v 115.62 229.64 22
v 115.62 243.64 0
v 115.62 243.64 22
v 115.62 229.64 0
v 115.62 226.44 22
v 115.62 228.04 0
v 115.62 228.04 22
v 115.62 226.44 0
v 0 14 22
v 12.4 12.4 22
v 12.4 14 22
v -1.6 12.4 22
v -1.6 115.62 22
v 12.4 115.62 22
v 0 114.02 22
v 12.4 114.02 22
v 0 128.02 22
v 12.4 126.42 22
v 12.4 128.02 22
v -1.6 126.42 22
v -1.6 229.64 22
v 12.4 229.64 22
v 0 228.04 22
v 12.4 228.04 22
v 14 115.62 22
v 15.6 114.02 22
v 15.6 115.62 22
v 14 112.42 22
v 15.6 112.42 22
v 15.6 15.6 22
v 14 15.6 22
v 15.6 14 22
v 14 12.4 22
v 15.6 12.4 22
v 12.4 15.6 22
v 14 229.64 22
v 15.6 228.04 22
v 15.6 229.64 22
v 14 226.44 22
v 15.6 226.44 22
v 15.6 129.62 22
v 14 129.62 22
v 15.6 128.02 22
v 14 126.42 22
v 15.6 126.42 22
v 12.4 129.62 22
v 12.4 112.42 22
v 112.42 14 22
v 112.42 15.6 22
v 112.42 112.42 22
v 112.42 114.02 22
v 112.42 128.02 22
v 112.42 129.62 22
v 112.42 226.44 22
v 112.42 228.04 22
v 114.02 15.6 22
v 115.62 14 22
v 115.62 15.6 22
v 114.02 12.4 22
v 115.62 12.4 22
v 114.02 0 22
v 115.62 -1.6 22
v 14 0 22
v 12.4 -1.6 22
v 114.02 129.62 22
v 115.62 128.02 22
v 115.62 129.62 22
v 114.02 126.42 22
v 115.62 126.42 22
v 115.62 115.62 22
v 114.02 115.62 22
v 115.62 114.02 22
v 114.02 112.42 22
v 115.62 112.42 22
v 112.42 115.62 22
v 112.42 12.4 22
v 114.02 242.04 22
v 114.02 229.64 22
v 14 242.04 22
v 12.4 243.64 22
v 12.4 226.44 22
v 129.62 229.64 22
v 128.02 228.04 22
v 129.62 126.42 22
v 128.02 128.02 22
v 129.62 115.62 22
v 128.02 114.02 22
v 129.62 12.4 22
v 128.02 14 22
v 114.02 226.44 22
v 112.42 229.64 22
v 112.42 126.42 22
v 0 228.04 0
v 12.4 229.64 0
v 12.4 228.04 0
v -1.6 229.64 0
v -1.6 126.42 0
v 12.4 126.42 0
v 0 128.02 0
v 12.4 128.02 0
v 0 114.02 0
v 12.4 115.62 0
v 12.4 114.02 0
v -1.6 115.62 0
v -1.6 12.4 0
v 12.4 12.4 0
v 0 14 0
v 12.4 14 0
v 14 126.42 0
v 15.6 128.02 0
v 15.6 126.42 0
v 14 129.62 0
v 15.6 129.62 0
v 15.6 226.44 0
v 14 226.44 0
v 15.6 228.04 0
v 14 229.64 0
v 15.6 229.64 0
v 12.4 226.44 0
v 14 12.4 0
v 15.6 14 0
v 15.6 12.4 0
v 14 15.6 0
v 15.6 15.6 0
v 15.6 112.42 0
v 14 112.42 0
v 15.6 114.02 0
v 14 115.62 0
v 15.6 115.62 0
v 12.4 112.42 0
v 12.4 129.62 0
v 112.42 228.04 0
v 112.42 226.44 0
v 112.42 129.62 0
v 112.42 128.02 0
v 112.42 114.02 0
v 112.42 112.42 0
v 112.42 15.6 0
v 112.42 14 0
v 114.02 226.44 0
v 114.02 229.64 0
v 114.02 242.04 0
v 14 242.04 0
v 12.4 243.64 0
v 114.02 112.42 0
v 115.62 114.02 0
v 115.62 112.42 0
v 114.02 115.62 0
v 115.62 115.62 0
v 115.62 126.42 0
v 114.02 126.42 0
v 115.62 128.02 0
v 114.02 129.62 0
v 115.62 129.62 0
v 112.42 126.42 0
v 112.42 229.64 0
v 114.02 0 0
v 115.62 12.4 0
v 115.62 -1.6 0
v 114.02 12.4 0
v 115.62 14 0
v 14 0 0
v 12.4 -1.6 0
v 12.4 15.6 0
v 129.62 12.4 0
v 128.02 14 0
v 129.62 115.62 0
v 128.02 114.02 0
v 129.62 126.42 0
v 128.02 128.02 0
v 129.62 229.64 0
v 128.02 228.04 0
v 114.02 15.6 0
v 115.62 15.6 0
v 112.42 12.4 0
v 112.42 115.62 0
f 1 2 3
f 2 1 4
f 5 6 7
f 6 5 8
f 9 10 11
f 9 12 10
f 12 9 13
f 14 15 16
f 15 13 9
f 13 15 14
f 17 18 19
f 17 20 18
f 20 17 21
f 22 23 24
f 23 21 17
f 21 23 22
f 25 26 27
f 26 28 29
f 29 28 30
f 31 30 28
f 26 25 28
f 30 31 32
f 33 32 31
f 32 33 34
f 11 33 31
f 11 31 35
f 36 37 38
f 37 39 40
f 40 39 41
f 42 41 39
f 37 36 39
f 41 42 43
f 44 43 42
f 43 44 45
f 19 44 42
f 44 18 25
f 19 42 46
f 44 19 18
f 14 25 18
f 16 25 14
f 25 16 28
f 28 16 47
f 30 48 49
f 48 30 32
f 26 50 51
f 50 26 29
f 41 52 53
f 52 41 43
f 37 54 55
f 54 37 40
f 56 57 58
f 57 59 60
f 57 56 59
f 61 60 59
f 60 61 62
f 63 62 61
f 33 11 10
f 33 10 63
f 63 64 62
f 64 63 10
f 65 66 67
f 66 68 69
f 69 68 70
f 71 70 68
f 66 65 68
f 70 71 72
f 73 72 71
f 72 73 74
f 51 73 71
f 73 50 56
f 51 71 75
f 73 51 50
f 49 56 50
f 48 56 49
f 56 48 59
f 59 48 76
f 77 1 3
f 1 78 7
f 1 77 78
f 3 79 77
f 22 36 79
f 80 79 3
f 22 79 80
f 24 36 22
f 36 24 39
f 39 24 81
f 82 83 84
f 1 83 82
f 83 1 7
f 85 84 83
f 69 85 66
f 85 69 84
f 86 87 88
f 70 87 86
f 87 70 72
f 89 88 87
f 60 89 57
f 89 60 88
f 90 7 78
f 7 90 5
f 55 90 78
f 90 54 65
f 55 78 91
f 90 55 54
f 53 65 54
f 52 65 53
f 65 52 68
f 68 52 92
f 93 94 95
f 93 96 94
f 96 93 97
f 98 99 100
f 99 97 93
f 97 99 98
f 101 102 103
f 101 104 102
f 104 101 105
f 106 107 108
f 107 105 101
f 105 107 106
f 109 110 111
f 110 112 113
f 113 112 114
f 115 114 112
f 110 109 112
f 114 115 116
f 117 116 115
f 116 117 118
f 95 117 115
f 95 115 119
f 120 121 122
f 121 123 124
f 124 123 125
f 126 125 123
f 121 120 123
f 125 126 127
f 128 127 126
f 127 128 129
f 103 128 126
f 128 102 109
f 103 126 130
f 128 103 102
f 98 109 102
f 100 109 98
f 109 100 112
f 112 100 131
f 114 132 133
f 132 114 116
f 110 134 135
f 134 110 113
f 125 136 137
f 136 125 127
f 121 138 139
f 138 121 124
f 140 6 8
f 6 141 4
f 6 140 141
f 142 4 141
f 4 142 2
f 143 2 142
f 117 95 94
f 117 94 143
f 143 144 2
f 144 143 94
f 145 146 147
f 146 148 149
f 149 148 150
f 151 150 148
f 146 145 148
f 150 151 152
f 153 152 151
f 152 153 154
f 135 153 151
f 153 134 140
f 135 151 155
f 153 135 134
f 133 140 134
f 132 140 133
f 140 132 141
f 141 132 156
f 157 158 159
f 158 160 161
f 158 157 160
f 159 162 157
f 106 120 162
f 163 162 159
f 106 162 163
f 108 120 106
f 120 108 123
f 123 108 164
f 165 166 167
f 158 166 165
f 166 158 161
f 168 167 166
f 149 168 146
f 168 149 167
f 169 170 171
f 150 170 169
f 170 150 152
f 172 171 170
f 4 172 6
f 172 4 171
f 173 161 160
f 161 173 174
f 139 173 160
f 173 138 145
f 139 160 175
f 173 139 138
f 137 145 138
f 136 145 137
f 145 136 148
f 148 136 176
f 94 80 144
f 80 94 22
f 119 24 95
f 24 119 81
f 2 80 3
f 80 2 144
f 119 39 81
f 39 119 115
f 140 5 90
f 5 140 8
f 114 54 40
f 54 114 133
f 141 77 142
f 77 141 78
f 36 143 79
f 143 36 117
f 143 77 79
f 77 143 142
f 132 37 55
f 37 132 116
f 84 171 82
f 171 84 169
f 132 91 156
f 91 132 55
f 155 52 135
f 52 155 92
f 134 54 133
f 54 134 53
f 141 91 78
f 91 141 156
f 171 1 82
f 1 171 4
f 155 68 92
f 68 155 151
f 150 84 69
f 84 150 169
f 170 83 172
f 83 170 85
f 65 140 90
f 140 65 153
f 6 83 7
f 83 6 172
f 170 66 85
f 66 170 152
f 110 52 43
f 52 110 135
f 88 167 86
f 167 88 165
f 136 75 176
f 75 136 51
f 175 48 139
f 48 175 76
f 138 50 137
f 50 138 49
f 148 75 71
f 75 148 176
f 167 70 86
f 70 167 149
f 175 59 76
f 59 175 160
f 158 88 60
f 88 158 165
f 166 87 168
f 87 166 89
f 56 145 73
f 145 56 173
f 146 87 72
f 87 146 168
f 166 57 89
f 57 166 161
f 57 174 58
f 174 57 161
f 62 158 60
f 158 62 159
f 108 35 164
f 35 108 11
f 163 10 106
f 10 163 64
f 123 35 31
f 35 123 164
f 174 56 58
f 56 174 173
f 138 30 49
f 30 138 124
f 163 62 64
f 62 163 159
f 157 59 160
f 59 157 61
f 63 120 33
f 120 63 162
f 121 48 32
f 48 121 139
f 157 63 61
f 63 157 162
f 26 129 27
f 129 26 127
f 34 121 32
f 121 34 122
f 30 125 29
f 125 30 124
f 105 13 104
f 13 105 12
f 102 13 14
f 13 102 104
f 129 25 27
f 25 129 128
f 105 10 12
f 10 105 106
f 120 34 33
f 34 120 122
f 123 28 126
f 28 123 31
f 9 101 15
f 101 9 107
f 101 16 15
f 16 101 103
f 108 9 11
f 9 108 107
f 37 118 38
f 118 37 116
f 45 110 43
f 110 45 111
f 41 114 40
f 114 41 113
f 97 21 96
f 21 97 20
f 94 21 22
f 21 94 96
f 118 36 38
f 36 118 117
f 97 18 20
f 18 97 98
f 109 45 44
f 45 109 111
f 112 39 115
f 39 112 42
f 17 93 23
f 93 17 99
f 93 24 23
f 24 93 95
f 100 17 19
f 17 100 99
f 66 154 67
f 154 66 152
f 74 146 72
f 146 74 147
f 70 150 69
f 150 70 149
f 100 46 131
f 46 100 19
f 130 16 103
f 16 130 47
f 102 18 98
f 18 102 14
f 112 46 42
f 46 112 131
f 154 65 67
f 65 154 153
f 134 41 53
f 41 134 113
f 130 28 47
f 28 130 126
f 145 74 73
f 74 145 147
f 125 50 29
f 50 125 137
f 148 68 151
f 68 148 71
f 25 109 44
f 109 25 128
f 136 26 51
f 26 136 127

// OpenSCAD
// ============================================================================
//  TANTEADOR DE PADEL - Piezas imprimibles (parametrico)
//
//  Abrir en OpenSCAD, elegir PIEZA abajo, F5 para ver, F6 para renderizar,
//  y exportar STL con F7.
//
//  IMPORTANTE: antes de imprimir en serio, medir la tira real y ajustar
//  PASO_LED y TIRA_ANCHO. Ver 3d/README.md.
// ============================================================================

// ------------------------- QUE PIEZA GENERAR --------------------------------
// "rejilla"    -> marco de paredes de un digito (la pieza principal)
// "mascara"    -> plancha frontal con las ventanas de los segmentos
// "celda"      -> una sola celda de segmento suelta (para probar el calce)
// "icono"      -> mascara de un icono del centro (flecha o triangulo)
// "powerbank"  -> bandeja porta power bank para la parte de atras
// "previo"     -> vista de todo junto (solo para mirar)
PIEZA = "rejilla";

// Tamano del digito a generar: "big" (puntos), "small" (juegos), "tiny" (sets)
TAMANO = "big";

// Forma del icono cuando PIEZA="icono": "flecha_izq", "flecha_der", "triangulo"
ICONO = "flecha_der";

// Partir la pieza si no entra en la cama: "completo", "inferior", "superior"
MITAD = "completo";

// ------------------------- MEDIDAS DE LA TIRA -------------------------------
// MEDIR ESTO EN LA TIRA REAL (ver README): contar 10 LEDs, medir y dividir.
PASO_LED    = 16.67;   // mm entre centros de LED. 60 LED/m -> 16.67
TIRA_ANCHO  = 10.0;    // mm de ancho de la tira (WS2812B IP20 5050 suele ser 10)

// LEDs por segmento, tiene que coincidir con config.h del firmware
LEDS_BIG    = 6;       // LEDS_PER_SEG_BIG   en LAYOUT_FULL
LEDS_SMALL  = 4;       // LEDS_PER_SEG_SMALL
LEDS_TINY   = 3;       // LEDS_PER_SEG_TINY

// ------------------------- PARAMETROS DE IMPRESION --------------------------
JUEGO       = 2.0;     // holgura a cada lado de la tira dentro de la celda
PARED       = 1.6;     // espesor de pared (4 perimetros a 0.4 mm)
ALTO        = 22;      // altura de la pared = distancia LED -> difusor
                       //   60 LED/m: 15-20 mm alcanza
                       //   30 LED/m: usar 25-30 mm (LEDs mas separados)
MASCARA_ESP = 2.4;     // espesor de la plancha frontal
BASE        = false;   // true agrega una base de 0.8 mm que une las 7 celdas.
                       //   false (recomendado) ahorra ~30 g por digito: las
                       //   paredes se pegan sobre la placa de fondo de carton
                       //   o PVC, que de todos modos hace falta.
CAMA_X      = 220;     // tamano de la cama de la impresora
CAMA_Y      = 220;
PIN_D       = 3.2;     // diametro del agujero para el pasador de alineacion
                       //   (se usa un trozo de filamento de 1.75 no, de 3 mm,
                       //    o un clavo; ver README)

$fn = 32;

// ============================================================================
//  GEOMETRIA DERIVADA
// ============================================================================
CELDA_W = TIRA_ANCHO + 2 * JUEGO;        // ancho interno de la celda

function n_leds(t) = t == "big"   ? LEDS_BIG   :
                     t == "small" ? LEDS_SMALL : LEDS_TINY;

function largo_luz(t) = n_leds(t) * PASO_LED;   // largo util del segmento
function digito_w(t)  = largo_luz(t) + 2 * CELDA_W;
function digito_h(t)  = 2 * largo_luz(t) + 3 * CELDA_W;

// Los 7 segmentos como [x, y, ancho, alto] del HUECO (no de la pared).
// Origen abajo a la izquierda del digito.
//        AAAA
//       F    B
//        GGGG
//       E    C
//        DDDD
function segmentos(t) = let (L = largo_luz(t), W = CELDA_W) [
  [ W,     2*L+2*W, L, W ],   // 0 = A  (arriba)
  [ W+L,   L+2*W,   W, L ],   // 1 = B  (arriba derecha)
  [ W+L,   W,       W, L ],   // 2 = C  (abajo derecha)
  [ W,     0,       L, W ],   // 3 = D  (abajo)
  [ 0,     W,       W, L ],   // 4 = E  (abajo izquierda)
  [ 0,     L+2*W,   W, L ],   // 5 = F  (arriba izquierda)
  [ W,     L+W,     L, W ]    // 6 = G  (medio)
];

// ============================================================================
//  MODULOS
// ============================================================================

// Tubo rectangular hueco: las 4 paredes de un segmento.
module celda_paredes(x, y, w, h, alto) {
  translate([x - PARED, y - PARED, 0])
    difference() {
      cube([w + 2*PARED, h + 2*PARED, alto]);
      translate([PARED, PARED, -1]) cube([w, h, alto + 2]);
    }
}

// Marco completo de un digito: las 7 celdas unidas (comparten pared donde se tocan)
module rejilla(t) {
  segs = segmentos(t);
  union() {
    for (s = segs) celda_paredes(s[0], s[1], s[2], s[3], ALTO);
    if (BASE)
      translate([-PARED, -PARED, 0])
        cube([digito_w(t) + 2*PARED, digito_h(t) + 2*PARED, 0.8]);
  }
}

// Plancha frontal con las ventanas de los 7 segmentos recortadas.
// Las ventanas van con un chaflan en las puntas, como un 7 segmentos real.
module mascara(t) {
  segs = segmentos(t);
  difference() {
    translate([-PARED, -PARED, 0])
      cube([digito_w(t) + 2*PARED, digito_h(t) + 2*PARED, MASCARA_ESP]);
    for (s = segs)
      translate([s[0], s[1], -1]) cube([s[2], s[3], MASCARA_ESP + 2]);
  }
}

// Una celda suelta, para imprimir primero y verificar que la tira entra.
module celda_suelta(t) {
  celda_paredes(0, 0, largo_luz(t), CELDA_W, ALTO);
}

// Mascara de un icono del centro.
module icono(forma) {
  lado = largo_luz("tiny");
  difference() {
    translate([-PARED, -PARED, 0])
      cube([lado + 2*PARED, lado + 2*PARED, MASCARA_ESP]);
    translate([0, 0, -1]) linear_extrude(MASCARA_ESP + 2)
      if (forma == "flecha_izq")      polygon([[lado,0],[lado,lado],[0,lado/2]]);
      else if (forma == "flecha_der") polygon([[0,0],[0,lado],[lado,lado/2]]);
      else                            polygon([[0,0],[lado,0],[lado/2,lado]]);
  }
}

// Bandeja porta power bank, se atornilla o se ata con precintos atras del panel.
PB_L = 160;   // largo del power bank  - MEDIR EL TUYO
PB_W = 80;    // ancho
PB_H = 25;    // espesor
PB_PARED = 2.4;
module powerbank() {
  difference() {
    union() {
      // bandeja
      cube([PB_L + 2*PB_PARED, PB_W + 2*PB_PARED, PB_H/2 + PB_PARED]);
      // orejas para precintos / tornillos
      for (x = [15, PB_L + 2*PB_PARED - 15])
        translate([x - 7, -10, 0]) cube([14, 10, 4]);
    }
    // hueco del power bank
    translate([PB_PARED, PB_PARED, PB_PARED])
      cube([PB_L, PB_W, PB_H]);
    // ventana lateral para el cable USB
    translate([-1, PB_PARED + PB_W/2 - 12, PB_PARED + 3])
      cube([PB_PARED + 2, 24, PB_H]);
    // ranura para la cinta de velcro que lo sujeta
    for (x = [PB_L*0.3, PB_L*0.7])
      translate([x, -1, -1]) cube([25, PB_W + 2*PB_PARED + 2, PB_PARED + 2]);
    // agujeros de los precintos en las orejas
    for (x = [15, PB_L + 2*PB_PARED - 15])
      translate([x, -5, -1]) cylinder(d = 5, h = 10);
  }
}

// Corta la pieza por la mitad en Y y agrega agujeros de pasador para pegarla.
module partir(t, mitad) {
  h = digito_h(t) + 2*PARED;
  corte = h / 2;
  intersection() {
    children();
    if (mitad == "inferior") translate([-50, -PARED - 1, -1]) cube([400, corte + 1, 200]);
    else                     translate([-50, -PARED + corte, -1]) cube([400, h, 200]);
  }
}

module agujeros_pin(t) {
  w = digito_w(t);
  for (x = [w * 0.15, w * 0.85])
    translate([x, digito_h(t)/2 - PARED/2, ALTO/2]) rotate([90,0,0])
      cylinder(d = PIN_D, h = 14, center = true);
}

// ============================================================================
//  SALIDA
// ============================================================================
module pieza_elegida() {
  if (PIEZA == "rejilla")        rejilla(TAMANO);
  else if (PIEZA == "mascara")   mascara(TAMANO);
  else if (PIEZA == "celda")     celda_suelta(TAMANO);
  else if (PIEZA == "icono")     icono(ICONO);
  else if (PIEZA == "powerbank") powerbank();
  else if (PIEZA == "previo") {
    rejilla("big");
    translate([digito_w("big") + 15, 0, 0]) rejilla("big");
    translate([0, -digito_h("small") - 15, 0]) rejilla("small");
    translate([digito_w("small") + 15, -digito_h("tiny") - 15, 0]) rejilla("tiny");
  }
}

if (PIEZA == "powerbank" || PIEZA == "celda" || PIEZA == "icono" || PIEZA == "previo")
  pieza_elegida();
else if (MITAD == "completo")
  pieza_elegida();
else
  difference() {
    partir(TAMANO, MITAD) pieza_elegida();
    agujeros_pin(TAMANO);
  }

// Aviso por consola con las medidas resultantes
echo(str("=== ", TAMANO, " : luz ", largo_luz(TAMANO),
         " mm | digito ", digito_w(TAMANO), " x ", digito_h(TAMANO), " mm ==="));
echo(str("=== cama ", CAMA_X, "x", CAMA_Y,
         " -> ", (digito_h(TAMANO) + 2*PARED > CAMA_Y) ? "HAY QUE PARTIR (MITAD)" : "entra completo", " ==="));
